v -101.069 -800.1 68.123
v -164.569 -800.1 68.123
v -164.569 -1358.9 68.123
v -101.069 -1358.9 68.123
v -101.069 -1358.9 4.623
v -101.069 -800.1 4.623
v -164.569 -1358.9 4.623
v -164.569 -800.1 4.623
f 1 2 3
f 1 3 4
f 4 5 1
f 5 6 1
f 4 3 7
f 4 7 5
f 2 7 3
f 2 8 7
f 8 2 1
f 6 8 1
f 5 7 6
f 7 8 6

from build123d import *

# Parameters (mm, degrees)
F0_W      = 63.5
F0_H      = 63.5
F1_DEPTH  = 1498.6
F2_DEPTH  = 1092.2
F3_DEPTH  = 203.2
F4_DEPTH  = 177.8
F5_DEPTH  = 279.4
F6_DEPTH  = 254
F7_DEPTH  = 25.4
F8_DEPTH  = 12.7
F9_DEPTH  = 12.7
F10_DEPTH = 12.7
F11_DEPTH = 38.1


with BuildPart() as f1:
    # F0 (on Front) → F1 (new body)
    with BuildSketch(Plane.XZ):
        with Locations((-132.8186606169, 36.3734573238)):
            Rectangle(F0_W, F0_H)
    extrude(amount=F1_DEPTH)

    # F2 (cut): a face of the model
    f2_faces = [f1.faces().sort_by_distance(p)[0] for p in [
        (-132.8186606169, 0, 36.3734573238),
    ]]
    extrude(f2_faces, amount=-F2_DEPTH, mode=Mode.SUBTRACT)

    # F3 (cut): a face of the model
    f3_faces = [f1.faces().sort_by_distance(p)[0] for p in [
        (-132.8186606169, -1092.2, 36.3734573238),
    ]]
    extrude(f3_faces, amount=-F3_DEPTH, mode=Mode.SUBTRACT)

    # F4 (cut): a face of the model
    f4_faces = [f1.faces().sort_by_distance(p)[0] for p in [
        (-132.8186606169, -1498.6, 36.3734573238),
    ]]
    extrude(f4_faces, amount=-F4_DEPTH, mode=Mode.SUBTRACT)

    # F5 (add): a face of the model
    f5_faces = [f1.faces().sort_by_distance(p)[0] for p in [
        (-132.8186606169, -1295.4, 36.3734573238),
    ]]
    extrude(f5_faces, amount=F5_DEPTH)

    # F6 (add): a face of the model
    f6_faces = [f1.faces().sort_by_distance(p)[0] for p in [
        (-132.8186606169, -1016, 36.3734573238),
    ]]
    extrude(f6_faces, amount=F6_DEPTH)

    # F7 (cut): a face of the model
    f7_faces = [f1.faces().sort_by_distance(p)[0] for p in [
        (-132.8186606169, -762, 36.3734573238),
    ]]
    extrude(f7_faces, amount=-F7_DEPTH, mode=Mode.SUBTRACT)

    # F8 (add): a face of the model
    f8_faces = [f1.faces().sort_by_distance(p)[0] for p in [
        (-132.8186606169, -787.4, 36.3734573238),
    ]]
    extrude(f8_faces, amount=F8_DEPTH)

    # F9 (cut): a face of the model
    f9_faces = [f1.faces().sort_by_distance(p)[0] for p in [
        (-132.8186606169, -774.7, 36.3734573238),
    ]]
    extrude(f9_faces, amount=-F9_DEPTH, mode=Mode.SUBTRACT)

    # F10 (cut): a face of the model
    f10_faces = [f1.faces().sort_by_distance(p)[0] for p in [
        (-132.8186606169, -787.4, 36.3734573238),
    ]]
    extrude(f10_faces, amount=-F10_DEPTH, mode=Mode.SUBTRACT)

    # F11 (add): a face of the model
    f11_faces = [f1.faces().sort_by_distance(p)[0] for p in [
        (-132.8186606169, -1320.8, 36.3734573238),
    ]]
    extrude(f11_faces, amount=F11_DEPTH)


solid = f1.part
